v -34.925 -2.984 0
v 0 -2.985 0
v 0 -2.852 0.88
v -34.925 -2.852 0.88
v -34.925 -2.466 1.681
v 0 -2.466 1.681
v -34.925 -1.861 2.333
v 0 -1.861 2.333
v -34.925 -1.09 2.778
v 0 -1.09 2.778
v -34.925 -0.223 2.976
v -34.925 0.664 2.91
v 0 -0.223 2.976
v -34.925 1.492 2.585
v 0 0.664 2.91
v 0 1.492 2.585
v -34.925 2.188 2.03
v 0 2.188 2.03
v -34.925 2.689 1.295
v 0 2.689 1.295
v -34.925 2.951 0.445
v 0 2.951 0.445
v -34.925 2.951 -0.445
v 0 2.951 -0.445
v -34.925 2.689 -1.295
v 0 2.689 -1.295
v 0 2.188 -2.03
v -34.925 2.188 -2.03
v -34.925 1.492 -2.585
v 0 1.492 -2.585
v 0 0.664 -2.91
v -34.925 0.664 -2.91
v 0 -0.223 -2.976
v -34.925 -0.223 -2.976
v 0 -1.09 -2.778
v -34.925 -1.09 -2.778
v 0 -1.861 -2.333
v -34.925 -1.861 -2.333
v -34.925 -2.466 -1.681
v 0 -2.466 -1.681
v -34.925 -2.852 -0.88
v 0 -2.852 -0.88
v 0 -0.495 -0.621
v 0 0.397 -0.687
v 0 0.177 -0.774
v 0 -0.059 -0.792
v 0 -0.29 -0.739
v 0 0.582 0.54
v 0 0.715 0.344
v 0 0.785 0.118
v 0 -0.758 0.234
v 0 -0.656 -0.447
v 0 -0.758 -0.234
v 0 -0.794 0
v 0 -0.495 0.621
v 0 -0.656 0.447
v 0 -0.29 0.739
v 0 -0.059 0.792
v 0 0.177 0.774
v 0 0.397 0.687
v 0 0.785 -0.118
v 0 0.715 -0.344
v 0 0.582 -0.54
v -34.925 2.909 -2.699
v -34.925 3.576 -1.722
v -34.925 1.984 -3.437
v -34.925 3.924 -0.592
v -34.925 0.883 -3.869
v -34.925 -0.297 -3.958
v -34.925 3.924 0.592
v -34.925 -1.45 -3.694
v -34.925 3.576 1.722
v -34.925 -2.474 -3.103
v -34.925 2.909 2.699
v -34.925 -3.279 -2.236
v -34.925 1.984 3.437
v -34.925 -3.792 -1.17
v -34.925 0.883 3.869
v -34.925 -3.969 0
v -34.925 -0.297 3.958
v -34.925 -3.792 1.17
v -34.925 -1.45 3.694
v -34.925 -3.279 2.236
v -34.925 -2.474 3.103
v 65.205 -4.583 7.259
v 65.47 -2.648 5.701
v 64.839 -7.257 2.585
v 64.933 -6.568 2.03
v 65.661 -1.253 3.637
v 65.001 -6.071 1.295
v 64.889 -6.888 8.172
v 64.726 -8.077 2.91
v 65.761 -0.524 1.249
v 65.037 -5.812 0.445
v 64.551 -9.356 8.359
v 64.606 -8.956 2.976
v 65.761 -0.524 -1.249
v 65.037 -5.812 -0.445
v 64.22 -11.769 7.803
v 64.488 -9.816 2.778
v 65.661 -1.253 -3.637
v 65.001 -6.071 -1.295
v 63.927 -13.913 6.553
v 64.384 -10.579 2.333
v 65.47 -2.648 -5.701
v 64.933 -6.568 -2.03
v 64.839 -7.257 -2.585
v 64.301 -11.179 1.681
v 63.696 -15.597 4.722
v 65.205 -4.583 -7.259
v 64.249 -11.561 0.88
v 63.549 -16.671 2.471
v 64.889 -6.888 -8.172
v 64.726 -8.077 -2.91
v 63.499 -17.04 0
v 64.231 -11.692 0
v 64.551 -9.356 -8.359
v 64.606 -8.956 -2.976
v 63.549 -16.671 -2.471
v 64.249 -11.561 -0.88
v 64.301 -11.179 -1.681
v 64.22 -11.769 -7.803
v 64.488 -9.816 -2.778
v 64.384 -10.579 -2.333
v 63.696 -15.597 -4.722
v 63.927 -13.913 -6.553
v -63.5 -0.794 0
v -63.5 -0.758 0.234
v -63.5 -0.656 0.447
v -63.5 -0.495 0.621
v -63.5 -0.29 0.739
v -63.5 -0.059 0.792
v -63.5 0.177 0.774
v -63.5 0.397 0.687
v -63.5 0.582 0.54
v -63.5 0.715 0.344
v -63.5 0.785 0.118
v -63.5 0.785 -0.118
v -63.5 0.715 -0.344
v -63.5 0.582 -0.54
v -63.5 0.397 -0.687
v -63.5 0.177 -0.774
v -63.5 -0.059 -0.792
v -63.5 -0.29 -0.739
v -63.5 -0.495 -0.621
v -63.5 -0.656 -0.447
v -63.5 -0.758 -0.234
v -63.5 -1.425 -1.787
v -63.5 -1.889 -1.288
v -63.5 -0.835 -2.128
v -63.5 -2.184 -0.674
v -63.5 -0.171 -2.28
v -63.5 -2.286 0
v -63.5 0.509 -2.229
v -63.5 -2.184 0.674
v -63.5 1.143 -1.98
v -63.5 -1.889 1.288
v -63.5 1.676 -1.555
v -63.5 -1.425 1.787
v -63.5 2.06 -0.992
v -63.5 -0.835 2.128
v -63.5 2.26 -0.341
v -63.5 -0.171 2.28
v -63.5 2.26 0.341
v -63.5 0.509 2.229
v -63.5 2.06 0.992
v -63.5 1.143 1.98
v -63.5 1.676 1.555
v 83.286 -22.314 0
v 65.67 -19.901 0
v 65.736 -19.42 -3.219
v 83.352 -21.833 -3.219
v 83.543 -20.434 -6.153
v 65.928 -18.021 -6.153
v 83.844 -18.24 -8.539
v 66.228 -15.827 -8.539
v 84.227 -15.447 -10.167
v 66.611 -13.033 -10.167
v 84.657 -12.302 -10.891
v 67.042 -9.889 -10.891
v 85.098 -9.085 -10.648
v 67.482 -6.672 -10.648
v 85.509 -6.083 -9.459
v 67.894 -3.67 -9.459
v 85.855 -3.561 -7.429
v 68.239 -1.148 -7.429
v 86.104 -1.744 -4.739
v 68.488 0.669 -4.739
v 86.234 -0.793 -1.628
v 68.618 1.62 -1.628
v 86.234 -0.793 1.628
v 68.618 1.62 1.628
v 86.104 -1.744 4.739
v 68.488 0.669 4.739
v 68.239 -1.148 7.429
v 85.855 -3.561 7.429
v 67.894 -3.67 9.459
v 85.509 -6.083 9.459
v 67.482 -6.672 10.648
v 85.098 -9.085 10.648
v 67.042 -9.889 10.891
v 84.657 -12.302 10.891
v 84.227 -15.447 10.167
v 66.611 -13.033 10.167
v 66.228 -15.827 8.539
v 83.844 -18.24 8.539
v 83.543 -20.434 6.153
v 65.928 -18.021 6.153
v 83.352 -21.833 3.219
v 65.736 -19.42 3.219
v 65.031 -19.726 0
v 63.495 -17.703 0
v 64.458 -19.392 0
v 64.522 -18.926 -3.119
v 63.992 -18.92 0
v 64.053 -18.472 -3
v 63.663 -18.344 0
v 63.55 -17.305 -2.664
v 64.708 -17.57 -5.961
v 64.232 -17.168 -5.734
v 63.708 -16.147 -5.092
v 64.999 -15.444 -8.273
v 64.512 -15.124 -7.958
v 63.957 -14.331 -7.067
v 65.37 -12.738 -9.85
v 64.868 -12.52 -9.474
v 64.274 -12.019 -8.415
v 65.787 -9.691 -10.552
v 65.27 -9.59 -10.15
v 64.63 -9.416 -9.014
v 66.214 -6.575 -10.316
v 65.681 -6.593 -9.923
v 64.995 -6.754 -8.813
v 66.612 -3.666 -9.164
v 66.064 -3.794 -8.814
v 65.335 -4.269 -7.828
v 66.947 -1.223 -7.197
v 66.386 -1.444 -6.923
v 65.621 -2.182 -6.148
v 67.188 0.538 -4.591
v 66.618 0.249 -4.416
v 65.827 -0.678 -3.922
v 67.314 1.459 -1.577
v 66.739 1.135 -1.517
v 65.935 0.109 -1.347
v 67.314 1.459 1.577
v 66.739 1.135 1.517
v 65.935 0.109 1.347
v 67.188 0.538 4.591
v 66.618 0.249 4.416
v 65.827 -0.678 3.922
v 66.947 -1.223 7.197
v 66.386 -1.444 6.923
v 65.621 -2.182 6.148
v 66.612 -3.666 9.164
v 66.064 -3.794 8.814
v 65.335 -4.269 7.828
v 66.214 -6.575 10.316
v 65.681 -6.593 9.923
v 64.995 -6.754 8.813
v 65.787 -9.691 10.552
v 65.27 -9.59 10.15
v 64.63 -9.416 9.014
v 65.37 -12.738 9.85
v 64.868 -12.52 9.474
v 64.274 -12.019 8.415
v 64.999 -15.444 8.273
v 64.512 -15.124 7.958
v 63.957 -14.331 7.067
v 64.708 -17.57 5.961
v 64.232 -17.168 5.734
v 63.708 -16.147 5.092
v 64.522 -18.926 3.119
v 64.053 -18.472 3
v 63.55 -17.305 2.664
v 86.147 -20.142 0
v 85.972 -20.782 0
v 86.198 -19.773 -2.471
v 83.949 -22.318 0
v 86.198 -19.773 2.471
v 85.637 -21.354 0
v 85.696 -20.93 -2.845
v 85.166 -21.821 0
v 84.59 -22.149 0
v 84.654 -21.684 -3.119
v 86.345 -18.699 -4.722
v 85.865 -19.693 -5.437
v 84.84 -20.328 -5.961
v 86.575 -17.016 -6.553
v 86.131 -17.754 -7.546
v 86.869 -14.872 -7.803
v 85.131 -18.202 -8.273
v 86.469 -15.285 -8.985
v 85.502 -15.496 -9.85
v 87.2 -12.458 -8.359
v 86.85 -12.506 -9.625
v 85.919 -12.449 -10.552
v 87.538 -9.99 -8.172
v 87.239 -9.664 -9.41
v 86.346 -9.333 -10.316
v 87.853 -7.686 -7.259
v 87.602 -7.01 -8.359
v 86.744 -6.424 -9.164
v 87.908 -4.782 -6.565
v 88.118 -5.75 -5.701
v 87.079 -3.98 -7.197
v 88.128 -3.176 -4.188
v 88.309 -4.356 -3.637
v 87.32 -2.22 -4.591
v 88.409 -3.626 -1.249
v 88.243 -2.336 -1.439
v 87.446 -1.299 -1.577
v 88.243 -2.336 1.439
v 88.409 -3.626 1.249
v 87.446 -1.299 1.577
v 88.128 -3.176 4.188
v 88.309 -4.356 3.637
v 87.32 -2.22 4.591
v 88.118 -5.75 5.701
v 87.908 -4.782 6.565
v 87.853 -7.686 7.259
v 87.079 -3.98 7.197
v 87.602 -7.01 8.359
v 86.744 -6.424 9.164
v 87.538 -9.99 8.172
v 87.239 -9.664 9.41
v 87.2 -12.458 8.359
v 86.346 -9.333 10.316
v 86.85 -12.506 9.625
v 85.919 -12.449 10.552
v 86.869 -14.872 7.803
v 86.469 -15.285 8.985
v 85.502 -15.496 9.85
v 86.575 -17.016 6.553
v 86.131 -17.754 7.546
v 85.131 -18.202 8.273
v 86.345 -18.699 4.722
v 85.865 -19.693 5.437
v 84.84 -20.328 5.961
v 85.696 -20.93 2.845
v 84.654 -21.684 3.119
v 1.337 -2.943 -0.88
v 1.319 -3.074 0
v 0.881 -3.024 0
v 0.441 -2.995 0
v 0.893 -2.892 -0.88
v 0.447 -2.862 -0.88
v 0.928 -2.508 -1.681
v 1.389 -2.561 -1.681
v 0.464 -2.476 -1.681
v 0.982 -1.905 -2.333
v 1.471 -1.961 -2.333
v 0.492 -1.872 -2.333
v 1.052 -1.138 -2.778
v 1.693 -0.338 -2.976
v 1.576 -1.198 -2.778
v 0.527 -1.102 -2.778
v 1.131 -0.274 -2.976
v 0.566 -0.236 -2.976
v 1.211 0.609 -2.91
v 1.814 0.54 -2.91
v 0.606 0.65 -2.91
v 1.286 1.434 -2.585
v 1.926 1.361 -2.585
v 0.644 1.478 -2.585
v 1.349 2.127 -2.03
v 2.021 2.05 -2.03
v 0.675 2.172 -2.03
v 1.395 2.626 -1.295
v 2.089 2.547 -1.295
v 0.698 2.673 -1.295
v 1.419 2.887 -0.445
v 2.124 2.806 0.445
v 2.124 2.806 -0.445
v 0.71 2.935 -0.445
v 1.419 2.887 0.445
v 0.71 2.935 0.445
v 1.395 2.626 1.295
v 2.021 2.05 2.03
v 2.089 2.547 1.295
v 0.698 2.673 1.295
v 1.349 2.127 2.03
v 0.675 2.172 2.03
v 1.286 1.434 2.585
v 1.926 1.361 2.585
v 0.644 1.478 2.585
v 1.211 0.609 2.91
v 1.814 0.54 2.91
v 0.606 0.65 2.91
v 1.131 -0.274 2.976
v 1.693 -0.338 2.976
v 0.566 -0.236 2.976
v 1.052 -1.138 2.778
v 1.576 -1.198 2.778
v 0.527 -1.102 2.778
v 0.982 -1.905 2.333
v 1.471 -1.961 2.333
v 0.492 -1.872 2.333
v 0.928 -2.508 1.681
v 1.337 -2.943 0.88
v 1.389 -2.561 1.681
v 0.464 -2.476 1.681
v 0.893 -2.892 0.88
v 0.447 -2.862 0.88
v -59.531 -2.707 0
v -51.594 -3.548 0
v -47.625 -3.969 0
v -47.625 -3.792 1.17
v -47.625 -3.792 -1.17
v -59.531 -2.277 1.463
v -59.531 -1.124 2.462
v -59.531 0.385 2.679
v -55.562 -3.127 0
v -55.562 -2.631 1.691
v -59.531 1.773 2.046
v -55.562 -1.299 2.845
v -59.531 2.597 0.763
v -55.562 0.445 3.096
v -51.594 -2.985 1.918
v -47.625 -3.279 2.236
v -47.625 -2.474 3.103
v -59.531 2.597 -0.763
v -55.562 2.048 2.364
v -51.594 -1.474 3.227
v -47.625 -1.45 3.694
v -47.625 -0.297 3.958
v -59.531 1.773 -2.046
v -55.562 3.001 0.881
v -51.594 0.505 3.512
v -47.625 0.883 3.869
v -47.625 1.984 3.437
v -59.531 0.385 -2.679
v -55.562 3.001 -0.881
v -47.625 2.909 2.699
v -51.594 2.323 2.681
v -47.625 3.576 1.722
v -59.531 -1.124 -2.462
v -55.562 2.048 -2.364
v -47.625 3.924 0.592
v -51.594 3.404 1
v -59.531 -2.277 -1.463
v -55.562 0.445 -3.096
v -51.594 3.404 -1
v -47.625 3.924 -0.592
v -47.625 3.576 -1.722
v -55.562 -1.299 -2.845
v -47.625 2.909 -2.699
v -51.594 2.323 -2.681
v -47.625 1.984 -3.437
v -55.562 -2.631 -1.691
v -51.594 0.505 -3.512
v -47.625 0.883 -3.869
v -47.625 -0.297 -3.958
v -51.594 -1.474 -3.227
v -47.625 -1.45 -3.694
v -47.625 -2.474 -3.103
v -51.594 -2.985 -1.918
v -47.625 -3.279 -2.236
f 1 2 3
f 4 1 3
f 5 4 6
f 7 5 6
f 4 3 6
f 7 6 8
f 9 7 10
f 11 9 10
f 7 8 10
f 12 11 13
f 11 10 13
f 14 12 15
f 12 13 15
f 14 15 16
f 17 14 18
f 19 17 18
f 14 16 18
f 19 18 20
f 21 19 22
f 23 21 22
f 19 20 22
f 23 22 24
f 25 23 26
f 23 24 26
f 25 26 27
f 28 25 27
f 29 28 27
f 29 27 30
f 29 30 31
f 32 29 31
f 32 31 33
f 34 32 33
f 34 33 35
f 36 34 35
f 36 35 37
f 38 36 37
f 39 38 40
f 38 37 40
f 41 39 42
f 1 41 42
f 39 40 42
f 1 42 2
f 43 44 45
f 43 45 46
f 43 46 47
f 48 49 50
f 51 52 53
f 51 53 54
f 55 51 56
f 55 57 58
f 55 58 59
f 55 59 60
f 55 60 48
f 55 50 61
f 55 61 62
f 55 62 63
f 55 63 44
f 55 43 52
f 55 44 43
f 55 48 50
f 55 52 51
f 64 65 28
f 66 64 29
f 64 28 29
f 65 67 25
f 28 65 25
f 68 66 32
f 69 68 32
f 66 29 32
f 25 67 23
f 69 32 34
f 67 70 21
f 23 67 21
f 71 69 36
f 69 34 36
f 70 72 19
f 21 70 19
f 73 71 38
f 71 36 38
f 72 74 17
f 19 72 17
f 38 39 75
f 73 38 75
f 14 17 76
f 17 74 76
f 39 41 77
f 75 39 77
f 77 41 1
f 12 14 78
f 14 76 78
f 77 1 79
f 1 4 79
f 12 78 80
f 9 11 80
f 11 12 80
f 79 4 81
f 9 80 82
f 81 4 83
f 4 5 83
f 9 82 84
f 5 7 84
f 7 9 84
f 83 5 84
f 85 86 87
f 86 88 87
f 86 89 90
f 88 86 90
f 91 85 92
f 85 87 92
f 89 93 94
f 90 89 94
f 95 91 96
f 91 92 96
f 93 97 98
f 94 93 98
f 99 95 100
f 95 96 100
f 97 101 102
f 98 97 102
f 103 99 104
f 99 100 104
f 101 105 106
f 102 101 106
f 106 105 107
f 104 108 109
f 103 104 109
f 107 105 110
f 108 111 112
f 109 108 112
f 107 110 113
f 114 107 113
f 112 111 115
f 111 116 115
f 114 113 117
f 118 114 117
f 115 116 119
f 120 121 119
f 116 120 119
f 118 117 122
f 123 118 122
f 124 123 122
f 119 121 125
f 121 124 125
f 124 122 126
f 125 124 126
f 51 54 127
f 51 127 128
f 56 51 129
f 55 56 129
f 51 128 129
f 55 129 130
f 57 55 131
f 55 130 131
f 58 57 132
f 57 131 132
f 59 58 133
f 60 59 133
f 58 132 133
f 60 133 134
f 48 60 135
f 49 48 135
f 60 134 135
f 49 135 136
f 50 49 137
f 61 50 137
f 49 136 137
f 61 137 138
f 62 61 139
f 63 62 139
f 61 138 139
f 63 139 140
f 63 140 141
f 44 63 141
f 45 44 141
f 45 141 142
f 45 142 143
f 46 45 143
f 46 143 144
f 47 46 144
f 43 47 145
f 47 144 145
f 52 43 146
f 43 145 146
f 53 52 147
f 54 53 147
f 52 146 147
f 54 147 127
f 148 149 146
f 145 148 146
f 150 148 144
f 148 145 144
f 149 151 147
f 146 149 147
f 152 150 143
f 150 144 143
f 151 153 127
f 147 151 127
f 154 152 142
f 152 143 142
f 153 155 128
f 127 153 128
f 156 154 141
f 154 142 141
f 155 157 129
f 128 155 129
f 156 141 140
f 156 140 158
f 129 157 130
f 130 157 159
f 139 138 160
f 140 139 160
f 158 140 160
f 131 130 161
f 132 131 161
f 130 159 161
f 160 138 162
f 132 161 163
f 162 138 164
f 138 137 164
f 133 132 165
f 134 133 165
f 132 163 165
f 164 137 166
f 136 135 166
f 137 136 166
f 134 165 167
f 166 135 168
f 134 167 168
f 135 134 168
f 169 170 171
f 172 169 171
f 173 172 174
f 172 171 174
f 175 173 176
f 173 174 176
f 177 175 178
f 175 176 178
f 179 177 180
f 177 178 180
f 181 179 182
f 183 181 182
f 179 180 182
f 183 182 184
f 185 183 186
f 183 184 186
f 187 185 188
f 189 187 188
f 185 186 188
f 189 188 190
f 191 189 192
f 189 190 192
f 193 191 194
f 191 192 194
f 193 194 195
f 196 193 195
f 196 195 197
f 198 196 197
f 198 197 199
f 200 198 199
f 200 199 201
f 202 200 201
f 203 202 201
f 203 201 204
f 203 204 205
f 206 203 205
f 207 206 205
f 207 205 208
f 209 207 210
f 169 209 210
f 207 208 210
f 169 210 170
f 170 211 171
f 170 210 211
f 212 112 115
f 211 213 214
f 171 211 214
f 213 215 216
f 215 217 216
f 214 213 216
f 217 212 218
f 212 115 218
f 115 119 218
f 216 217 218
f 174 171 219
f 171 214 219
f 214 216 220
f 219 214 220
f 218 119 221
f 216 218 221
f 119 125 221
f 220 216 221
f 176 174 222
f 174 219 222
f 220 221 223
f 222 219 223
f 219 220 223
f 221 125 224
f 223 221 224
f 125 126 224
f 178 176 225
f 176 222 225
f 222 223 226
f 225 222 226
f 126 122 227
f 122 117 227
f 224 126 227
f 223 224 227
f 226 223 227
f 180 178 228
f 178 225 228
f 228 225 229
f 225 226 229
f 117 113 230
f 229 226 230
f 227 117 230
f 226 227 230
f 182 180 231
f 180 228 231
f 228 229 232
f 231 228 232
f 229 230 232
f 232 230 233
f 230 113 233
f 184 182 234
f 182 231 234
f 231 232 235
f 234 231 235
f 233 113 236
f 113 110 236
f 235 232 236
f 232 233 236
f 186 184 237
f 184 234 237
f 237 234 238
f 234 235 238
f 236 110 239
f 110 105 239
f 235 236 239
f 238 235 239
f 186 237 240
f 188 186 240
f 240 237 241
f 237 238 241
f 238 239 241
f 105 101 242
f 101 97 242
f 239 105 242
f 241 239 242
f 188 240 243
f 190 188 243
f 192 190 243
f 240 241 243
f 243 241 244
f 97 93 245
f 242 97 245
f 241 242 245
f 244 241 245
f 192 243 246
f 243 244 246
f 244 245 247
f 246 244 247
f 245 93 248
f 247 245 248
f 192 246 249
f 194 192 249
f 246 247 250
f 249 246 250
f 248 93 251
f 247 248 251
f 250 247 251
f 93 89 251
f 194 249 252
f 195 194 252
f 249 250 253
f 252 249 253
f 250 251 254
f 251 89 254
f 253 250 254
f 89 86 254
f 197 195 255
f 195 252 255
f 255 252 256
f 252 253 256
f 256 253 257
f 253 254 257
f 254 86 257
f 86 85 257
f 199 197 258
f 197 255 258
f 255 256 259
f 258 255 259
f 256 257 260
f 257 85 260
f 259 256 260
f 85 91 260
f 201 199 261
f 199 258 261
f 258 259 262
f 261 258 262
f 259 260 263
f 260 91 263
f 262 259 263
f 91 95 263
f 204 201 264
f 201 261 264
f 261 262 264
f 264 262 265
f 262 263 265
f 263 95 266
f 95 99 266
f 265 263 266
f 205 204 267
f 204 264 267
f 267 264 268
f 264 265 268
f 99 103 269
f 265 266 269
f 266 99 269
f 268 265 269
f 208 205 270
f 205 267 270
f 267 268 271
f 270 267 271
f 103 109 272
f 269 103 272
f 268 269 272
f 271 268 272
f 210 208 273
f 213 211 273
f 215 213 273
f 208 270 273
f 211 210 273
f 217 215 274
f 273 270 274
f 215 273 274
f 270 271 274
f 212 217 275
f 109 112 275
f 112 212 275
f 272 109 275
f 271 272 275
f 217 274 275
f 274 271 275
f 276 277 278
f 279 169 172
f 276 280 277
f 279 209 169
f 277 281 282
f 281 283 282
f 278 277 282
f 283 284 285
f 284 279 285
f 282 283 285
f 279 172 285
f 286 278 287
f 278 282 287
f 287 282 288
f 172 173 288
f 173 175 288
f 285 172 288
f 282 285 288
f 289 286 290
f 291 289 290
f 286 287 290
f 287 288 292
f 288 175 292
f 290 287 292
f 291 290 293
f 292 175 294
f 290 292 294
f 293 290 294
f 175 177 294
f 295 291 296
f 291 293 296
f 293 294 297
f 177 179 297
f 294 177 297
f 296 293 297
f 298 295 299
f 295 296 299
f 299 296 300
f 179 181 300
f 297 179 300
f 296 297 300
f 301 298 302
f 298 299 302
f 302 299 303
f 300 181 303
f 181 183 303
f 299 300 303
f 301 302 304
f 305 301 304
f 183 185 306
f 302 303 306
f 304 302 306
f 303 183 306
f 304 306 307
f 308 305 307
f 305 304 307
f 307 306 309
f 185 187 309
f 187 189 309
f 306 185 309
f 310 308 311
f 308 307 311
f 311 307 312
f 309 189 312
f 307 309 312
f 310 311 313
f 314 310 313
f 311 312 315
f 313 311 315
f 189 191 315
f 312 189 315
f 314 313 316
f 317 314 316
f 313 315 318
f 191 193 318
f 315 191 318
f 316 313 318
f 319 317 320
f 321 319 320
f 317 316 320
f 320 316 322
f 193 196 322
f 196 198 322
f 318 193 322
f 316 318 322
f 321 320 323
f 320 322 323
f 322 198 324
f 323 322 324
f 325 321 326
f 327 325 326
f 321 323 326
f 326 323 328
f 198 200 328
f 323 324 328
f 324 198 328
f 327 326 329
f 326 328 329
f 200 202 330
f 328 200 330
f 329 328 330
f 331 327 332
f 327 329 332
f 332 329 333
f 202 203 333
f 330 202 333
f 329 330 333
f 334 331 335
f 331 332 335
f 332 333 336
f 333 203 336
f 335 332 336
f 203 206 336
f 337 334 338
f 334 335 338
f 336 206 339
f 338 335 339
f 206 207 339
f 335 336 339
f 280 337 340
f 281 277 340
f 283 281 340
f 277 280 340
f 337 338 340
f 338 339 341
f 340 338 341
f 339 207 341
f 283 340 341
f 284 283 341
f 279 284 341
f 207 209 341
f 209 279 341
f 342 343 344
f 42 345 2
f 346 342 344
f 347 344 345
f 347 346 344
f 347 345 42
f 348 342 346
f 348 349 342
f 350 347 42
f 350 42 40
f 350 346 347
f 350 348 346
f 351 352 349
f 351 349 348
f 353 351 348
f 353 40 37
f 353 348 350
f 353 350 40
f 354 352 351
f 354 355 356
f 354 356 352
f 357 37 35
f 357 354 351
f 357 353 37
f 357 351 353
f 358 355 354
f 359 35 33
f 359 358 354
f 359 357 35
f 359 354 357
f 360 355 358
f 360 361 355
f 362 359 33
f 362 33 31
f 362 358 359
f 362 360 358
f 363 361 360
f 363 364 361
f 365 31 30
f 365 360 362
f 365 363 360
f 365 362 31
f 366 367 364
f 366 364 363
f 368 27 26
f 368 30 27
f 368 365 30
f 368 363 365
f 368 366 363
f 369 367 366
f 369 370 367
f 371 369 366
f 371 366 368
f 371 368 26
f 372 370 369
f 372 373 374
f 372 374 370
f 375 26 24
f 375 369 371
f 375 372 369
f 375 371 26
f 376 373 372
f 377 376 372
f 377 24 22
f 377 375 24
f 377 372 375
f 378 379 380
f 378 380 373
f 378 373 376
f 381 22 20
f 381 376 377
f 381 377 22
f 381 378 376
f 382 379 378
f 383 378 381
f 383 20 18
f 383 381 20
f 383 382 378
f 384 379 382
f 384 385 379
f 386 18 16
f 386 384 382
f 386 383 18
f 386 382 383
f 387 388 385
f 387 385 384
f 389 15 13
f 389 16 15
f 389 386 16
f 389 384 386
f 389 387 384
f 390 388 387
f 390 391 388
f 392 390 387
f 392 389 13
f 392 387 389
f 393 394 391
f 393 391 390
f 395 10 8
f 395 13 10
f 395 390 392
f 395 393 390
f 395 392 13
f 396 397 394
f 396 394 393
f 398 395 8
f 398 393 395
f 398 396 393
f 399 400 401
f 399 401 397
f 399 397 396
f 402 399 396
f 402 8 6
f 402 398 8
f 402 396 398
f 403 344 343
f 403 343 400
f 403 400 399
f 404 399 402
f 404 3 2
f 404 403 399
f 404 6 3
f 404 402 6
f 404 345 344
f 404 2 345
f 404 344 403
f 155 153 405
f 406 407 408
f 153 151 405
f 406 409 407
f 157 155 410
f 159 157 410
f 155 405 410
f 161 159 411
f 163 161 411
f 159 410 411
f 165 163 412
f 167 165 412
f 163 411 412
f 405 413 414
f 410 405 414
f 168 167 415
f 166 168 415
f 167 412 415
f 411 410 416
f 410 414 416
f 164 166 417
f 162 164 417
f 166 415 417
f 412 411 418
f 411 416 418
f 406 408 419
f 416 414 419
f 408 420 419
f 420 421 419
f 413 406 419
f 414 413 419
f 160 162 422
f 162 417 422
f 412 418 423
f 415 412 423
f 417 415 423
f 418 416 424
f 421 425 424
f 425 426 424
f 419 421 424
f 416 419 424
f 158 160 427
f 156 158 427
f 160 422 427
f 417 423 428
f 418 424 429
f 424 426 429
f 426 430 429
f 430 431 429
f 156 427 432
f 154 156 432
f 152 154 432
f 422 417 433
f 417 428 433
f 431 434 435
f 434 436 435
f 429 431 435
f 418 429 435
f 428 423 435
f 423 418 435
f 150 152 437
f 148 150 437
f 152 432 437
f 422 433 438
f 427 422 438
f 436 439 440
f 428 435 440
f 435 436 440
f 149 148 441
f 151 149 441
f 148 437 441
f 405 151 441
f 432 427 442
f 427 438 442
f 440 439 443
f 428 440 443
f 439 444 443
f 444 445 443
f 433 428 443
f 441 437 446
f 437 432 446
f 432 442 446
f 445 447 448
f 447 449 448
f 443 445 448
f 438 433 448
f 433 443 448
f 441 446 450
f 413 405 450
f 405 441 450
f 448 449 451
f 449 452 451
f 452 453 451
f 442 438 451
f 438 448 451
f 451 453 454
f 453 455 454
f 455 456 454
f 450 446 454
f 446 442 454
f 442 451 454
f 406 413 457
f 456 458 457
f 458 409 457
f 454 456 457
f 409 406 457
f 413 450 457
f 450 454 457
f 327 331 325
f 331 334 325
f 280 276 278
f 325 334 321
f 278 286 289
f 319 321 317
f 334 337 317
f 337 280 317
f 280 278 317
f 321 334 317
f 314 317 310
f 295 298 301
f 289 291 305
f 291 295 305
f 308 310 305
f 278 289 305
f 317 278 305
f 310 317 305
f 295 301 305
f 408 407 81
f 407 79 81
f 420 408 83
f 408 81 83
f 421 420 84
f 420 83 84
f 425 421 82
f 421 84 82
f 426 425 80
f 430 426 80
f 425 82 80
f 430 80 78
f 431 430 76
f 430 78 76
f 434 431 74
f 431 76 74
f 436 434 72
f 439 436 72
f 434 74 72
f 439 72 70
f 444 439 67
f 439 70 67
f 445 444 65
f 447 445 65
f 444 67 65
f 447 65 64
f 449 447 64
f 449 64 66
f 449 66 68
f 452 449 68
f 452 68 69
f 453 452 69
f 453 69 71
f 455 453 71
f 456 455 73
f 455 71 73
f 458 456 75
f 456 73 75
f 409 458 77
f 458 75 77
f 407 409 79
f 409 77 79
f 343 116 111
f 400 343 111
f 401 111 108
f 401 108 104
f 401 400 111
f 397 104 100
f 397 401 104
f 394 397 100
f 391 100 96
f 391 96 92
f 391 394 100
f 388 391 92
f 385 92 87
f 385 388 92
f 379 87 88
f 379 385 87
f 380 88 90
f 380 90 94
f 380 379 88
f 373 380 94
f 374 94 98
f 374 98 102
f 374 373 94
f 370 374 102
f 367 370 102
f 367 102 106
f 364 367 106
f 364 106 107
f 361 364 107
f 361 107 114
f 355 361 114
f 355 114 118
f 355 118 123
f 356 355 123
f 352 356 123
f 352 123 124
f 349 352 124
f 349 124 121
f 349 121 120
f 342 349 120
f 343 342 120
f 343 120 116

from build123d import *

# Parameters (mm, degrees)
SWEEP1_PROFILE_R = 2.9845
FILLET1_R        = 2.54


with BuildPart() as part:
    # Sketch1 → Revolve1 (revolve)
    with BuildSketch(Plane.XY):
        Polygon((-63.5, -0.79375), (-63.5, -2.286), (-47.625, -3.96875), (-34.925, -3.96875), (-34.925, -2.9845), (0, -2.9845), (0, -0.79375), align=None)
    revolve(axis=Axis((0, 0, 0), (-1, 0, 0)))

    # Sweep1: sweep along a path in Sketch2
    with BuildLine(Plane.XY) as sweep1_path:
        Line((64.63607564, -8.735441276), (1.72358777, -0.117502426))
        ThreePointArc((1.72358777, -0.117502426), (0.863794191, -0.029409659), (0, 0))
    # Sweep1 profile (on start of the path) → Sweep1 (sweep)
    with BuildSketch(Plane(origin=(64.63607564, -8.735441276, 0), x_dir=(-0.135715572, -0.99074784, 0), z_dir=(-0.99074784, 0.135715572, 0))):
        Circle(SWEEP1_PROFILE_R)
    sweep(path=sweep1_path.line)

    # Sketch15 → Revolve2 (revolve)
    with BuildSketch(Plane.XY):
        Polygon((87.284571273, -11.837899261), (85.802285791, -22.658847175), (63.153790158, -19.556389189), (64.63607564, -8.735441276), align=None)
    revolve(axis=Axis((64.63607564, -8.735441276, 0), (0.99074784, -0.135715572, 0)))

    # Fillet1
    fillet1_edges = [part.edges().sort_by_distance(p)[0] for p in [
        (88.766856755, -1.016951348, 0),
        (66.118361122, 2.085506638, 0),
    ]]
    fillet(fillet1_edges, radius=FILLET1_R)


solid = part.part
